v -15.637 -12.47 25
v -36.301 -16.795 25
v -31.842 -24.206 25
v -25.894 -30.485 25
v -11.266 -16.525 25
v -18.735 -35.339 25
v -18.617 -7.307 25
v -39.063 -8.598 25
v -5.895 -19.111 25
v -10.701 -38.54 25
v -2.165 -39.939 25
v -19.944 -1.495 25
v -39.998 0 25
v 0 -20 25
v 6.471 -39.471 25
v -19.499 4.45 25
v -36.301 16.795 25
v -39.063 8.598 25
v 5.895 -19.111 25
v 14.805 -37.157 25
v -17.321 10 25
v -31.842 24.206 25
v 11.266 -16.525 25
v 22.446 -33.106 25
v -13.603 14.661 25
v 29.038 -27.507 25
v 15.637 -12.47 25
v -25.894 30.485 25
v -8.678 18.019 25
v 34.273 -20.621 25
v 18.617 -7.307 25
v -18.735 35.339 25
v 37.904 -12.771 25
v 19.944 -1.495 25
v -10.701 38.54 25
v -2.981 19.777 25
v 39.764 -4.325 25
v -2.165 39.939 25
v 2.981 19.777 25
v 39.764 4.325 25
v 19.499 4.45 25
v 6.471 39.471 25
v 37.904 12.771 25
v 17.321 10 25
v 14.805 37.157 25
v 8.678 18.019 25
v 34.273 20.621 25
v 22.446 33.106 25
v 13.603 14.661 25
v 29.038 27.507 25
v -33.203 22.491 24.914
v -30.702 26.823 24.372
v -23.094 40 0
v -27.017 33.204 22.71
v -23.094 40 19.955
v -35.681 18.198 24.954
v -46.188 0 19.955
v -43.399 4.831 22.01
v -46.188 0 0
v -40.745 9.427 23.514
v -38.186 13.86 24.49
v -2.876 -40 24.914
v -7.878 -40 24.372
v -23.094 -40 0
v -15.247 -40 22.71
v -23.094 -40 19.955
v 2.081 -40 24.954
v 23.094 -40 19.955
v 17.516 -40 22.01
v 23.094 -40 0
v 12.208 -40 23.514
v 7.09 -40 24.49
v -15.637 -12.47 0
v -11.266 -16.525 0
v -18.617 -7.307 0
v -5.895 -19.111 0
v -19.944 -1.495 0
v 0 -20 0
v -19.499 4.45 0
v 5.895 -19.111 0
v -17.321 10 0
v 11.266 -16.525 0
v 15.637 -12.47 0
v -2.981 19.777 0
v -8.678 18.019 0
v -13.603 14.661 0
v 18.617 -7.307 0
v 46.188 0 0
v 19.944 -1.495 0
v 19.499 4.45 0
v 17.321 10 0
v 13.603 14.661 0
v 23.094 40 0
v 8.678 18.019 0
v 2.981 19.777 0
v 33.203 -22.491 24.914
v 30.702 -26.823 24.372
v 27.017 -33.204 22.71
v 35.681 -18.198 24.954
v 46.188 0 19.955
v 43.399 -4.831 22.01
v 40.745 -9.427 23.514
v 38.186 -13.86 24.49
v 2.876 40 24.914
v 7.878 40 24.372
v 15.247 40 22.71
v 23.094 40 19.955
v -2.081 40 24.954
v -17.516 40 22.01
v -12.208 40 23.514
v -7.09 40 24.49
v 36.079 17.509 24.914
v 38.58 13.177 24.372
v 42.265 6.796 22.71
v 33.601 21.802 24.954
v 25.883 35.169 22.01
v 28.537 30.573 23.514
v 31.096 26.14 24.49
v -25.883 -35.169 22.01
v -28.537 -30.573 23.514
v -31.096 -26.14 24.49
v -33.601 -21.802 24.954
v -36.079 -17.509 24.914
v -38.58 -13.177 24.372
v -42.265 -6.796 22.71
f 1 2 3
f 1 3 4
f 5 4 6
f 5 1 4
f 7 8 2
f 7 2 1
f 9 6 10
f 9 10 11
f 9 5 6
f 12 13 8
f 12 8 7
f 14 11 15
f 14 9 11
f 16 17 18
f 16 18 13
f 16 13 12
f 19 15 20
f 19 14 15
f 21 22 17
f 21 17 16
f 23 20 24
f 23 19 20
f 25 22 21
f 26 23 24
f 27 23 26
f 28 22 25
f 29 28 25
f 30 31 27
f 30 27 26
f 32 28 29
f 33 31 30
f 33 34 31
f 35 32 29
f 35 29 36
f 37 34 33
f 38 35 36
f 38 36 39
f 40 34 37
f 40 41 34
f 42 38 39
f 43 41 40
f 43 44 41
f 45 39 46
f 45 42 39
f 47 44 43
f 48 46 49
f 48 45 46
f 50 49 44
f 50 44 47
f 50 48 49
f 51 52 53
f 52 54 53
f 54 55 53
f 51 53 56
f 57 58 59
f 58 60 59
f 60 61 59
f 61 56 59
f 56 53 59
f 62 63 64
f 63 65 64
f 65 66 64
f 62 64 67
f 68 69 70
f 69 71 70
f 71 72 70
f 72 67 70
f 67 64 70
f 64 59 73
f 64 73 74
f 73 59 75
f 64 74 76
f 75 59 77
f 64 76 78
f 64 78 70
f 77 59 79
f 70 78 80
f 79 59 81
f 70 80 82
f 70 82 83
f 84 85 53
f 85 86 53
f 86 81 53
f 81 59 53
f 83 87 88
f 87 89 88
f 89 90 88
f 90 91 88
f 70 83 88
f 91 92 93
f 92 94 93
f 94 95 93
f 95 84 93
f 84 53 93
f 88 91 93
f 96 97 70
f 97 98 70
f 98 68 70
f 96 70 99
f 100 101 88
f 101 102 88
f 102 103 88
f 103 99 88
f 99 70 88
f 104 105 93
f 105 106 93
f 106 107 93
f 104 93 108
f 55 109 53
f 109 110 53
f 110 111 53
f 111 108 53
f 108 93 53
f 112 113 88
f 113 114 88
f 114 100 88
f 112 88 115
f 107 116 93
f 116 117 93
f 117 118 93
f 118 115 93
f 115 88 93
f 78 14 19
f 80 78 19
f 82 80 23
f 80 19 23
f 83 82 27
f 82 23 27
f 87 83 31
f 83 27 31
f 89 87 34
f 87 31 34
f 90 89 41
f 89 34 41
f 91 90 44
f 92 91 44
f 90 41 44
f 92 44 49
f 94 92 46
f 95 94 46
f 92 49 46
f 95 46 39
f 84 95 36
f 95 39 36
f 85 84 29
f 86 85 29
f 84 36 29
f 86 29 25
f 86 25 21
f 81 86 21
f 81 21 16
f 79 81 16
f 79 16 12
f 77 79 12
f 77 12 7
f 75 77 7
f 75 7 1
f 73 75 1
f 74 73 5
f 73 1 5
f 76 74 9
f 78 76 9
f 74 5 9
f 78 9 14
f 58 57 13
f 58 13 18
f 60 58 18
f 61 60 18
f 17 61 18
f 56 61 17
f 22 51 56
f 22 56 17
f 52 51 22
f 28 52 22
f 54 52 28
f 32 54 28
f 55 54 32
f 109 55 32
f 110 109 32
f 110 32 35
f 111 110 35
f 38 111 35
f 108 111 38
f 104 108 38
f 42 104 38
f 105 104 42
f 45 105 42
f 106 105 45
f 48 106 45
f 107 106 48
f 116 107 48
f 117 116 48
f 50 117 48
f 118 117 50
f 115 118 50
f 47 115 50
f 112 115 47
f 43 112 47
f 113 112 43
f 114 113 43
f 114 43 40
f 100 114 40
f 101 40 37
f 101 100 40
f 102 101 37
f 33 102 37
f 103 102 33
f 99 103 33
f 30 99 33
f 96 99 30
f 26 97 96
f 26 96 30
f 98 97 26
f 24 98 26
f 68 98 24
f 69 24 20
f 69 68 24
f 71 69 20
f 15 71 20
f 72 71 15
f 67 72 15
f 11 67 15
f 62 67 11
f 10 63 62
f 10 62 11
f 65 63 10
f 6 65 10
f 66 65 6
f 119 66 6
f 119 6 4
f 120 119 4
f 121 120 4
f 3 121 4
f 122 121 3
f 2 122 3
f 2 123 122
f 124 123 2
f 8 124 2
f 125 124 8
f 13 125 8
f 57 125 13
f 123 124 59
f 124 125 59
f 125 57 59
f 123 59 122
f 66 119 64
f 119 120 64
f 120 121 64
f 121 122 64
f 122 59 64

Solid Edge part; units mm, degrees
sketch "Sketch1" plane through (0, 0, 0) normal (0, 0, 1) x (1, 0, 0)
  line L0 (-23.094, 40) -> (-46.188, 0)
  line L1 (-46.188, 0) -> (-23.094, -40)
  line L2 (-23.094, -40) -> (23.094, -40)
  line L3 (23.094, -40) -> (46.188, 0)
  line L4 (46.188, 0) -> (23.094, 40)
  line L5 (23.094, 40) -> (-23.094, 40)
extrude "Protrusion1" add sketch "Sketch1" along normal blind 25
hole "Hole_5" at (0, 0, 25) direction (0, 0, -1) diameter 40 end up to next
sketch "Sketch2" plane through (0, 0, 0) normal (0, -1, 0) x (1, 0, 0)
  line L0 (-39.998, 25) -> (-46.188, 25)
  line L1 (-46.188, 25) -> (-46.188, 19.955)
  line L2 (-46.188, 19.955) -> (-39.998, 25)
revolve "RevolvedCutout1" cut sketch "Sketch2" angle 360 about axis through (0, 0, 0) along (0, 0, 1)
